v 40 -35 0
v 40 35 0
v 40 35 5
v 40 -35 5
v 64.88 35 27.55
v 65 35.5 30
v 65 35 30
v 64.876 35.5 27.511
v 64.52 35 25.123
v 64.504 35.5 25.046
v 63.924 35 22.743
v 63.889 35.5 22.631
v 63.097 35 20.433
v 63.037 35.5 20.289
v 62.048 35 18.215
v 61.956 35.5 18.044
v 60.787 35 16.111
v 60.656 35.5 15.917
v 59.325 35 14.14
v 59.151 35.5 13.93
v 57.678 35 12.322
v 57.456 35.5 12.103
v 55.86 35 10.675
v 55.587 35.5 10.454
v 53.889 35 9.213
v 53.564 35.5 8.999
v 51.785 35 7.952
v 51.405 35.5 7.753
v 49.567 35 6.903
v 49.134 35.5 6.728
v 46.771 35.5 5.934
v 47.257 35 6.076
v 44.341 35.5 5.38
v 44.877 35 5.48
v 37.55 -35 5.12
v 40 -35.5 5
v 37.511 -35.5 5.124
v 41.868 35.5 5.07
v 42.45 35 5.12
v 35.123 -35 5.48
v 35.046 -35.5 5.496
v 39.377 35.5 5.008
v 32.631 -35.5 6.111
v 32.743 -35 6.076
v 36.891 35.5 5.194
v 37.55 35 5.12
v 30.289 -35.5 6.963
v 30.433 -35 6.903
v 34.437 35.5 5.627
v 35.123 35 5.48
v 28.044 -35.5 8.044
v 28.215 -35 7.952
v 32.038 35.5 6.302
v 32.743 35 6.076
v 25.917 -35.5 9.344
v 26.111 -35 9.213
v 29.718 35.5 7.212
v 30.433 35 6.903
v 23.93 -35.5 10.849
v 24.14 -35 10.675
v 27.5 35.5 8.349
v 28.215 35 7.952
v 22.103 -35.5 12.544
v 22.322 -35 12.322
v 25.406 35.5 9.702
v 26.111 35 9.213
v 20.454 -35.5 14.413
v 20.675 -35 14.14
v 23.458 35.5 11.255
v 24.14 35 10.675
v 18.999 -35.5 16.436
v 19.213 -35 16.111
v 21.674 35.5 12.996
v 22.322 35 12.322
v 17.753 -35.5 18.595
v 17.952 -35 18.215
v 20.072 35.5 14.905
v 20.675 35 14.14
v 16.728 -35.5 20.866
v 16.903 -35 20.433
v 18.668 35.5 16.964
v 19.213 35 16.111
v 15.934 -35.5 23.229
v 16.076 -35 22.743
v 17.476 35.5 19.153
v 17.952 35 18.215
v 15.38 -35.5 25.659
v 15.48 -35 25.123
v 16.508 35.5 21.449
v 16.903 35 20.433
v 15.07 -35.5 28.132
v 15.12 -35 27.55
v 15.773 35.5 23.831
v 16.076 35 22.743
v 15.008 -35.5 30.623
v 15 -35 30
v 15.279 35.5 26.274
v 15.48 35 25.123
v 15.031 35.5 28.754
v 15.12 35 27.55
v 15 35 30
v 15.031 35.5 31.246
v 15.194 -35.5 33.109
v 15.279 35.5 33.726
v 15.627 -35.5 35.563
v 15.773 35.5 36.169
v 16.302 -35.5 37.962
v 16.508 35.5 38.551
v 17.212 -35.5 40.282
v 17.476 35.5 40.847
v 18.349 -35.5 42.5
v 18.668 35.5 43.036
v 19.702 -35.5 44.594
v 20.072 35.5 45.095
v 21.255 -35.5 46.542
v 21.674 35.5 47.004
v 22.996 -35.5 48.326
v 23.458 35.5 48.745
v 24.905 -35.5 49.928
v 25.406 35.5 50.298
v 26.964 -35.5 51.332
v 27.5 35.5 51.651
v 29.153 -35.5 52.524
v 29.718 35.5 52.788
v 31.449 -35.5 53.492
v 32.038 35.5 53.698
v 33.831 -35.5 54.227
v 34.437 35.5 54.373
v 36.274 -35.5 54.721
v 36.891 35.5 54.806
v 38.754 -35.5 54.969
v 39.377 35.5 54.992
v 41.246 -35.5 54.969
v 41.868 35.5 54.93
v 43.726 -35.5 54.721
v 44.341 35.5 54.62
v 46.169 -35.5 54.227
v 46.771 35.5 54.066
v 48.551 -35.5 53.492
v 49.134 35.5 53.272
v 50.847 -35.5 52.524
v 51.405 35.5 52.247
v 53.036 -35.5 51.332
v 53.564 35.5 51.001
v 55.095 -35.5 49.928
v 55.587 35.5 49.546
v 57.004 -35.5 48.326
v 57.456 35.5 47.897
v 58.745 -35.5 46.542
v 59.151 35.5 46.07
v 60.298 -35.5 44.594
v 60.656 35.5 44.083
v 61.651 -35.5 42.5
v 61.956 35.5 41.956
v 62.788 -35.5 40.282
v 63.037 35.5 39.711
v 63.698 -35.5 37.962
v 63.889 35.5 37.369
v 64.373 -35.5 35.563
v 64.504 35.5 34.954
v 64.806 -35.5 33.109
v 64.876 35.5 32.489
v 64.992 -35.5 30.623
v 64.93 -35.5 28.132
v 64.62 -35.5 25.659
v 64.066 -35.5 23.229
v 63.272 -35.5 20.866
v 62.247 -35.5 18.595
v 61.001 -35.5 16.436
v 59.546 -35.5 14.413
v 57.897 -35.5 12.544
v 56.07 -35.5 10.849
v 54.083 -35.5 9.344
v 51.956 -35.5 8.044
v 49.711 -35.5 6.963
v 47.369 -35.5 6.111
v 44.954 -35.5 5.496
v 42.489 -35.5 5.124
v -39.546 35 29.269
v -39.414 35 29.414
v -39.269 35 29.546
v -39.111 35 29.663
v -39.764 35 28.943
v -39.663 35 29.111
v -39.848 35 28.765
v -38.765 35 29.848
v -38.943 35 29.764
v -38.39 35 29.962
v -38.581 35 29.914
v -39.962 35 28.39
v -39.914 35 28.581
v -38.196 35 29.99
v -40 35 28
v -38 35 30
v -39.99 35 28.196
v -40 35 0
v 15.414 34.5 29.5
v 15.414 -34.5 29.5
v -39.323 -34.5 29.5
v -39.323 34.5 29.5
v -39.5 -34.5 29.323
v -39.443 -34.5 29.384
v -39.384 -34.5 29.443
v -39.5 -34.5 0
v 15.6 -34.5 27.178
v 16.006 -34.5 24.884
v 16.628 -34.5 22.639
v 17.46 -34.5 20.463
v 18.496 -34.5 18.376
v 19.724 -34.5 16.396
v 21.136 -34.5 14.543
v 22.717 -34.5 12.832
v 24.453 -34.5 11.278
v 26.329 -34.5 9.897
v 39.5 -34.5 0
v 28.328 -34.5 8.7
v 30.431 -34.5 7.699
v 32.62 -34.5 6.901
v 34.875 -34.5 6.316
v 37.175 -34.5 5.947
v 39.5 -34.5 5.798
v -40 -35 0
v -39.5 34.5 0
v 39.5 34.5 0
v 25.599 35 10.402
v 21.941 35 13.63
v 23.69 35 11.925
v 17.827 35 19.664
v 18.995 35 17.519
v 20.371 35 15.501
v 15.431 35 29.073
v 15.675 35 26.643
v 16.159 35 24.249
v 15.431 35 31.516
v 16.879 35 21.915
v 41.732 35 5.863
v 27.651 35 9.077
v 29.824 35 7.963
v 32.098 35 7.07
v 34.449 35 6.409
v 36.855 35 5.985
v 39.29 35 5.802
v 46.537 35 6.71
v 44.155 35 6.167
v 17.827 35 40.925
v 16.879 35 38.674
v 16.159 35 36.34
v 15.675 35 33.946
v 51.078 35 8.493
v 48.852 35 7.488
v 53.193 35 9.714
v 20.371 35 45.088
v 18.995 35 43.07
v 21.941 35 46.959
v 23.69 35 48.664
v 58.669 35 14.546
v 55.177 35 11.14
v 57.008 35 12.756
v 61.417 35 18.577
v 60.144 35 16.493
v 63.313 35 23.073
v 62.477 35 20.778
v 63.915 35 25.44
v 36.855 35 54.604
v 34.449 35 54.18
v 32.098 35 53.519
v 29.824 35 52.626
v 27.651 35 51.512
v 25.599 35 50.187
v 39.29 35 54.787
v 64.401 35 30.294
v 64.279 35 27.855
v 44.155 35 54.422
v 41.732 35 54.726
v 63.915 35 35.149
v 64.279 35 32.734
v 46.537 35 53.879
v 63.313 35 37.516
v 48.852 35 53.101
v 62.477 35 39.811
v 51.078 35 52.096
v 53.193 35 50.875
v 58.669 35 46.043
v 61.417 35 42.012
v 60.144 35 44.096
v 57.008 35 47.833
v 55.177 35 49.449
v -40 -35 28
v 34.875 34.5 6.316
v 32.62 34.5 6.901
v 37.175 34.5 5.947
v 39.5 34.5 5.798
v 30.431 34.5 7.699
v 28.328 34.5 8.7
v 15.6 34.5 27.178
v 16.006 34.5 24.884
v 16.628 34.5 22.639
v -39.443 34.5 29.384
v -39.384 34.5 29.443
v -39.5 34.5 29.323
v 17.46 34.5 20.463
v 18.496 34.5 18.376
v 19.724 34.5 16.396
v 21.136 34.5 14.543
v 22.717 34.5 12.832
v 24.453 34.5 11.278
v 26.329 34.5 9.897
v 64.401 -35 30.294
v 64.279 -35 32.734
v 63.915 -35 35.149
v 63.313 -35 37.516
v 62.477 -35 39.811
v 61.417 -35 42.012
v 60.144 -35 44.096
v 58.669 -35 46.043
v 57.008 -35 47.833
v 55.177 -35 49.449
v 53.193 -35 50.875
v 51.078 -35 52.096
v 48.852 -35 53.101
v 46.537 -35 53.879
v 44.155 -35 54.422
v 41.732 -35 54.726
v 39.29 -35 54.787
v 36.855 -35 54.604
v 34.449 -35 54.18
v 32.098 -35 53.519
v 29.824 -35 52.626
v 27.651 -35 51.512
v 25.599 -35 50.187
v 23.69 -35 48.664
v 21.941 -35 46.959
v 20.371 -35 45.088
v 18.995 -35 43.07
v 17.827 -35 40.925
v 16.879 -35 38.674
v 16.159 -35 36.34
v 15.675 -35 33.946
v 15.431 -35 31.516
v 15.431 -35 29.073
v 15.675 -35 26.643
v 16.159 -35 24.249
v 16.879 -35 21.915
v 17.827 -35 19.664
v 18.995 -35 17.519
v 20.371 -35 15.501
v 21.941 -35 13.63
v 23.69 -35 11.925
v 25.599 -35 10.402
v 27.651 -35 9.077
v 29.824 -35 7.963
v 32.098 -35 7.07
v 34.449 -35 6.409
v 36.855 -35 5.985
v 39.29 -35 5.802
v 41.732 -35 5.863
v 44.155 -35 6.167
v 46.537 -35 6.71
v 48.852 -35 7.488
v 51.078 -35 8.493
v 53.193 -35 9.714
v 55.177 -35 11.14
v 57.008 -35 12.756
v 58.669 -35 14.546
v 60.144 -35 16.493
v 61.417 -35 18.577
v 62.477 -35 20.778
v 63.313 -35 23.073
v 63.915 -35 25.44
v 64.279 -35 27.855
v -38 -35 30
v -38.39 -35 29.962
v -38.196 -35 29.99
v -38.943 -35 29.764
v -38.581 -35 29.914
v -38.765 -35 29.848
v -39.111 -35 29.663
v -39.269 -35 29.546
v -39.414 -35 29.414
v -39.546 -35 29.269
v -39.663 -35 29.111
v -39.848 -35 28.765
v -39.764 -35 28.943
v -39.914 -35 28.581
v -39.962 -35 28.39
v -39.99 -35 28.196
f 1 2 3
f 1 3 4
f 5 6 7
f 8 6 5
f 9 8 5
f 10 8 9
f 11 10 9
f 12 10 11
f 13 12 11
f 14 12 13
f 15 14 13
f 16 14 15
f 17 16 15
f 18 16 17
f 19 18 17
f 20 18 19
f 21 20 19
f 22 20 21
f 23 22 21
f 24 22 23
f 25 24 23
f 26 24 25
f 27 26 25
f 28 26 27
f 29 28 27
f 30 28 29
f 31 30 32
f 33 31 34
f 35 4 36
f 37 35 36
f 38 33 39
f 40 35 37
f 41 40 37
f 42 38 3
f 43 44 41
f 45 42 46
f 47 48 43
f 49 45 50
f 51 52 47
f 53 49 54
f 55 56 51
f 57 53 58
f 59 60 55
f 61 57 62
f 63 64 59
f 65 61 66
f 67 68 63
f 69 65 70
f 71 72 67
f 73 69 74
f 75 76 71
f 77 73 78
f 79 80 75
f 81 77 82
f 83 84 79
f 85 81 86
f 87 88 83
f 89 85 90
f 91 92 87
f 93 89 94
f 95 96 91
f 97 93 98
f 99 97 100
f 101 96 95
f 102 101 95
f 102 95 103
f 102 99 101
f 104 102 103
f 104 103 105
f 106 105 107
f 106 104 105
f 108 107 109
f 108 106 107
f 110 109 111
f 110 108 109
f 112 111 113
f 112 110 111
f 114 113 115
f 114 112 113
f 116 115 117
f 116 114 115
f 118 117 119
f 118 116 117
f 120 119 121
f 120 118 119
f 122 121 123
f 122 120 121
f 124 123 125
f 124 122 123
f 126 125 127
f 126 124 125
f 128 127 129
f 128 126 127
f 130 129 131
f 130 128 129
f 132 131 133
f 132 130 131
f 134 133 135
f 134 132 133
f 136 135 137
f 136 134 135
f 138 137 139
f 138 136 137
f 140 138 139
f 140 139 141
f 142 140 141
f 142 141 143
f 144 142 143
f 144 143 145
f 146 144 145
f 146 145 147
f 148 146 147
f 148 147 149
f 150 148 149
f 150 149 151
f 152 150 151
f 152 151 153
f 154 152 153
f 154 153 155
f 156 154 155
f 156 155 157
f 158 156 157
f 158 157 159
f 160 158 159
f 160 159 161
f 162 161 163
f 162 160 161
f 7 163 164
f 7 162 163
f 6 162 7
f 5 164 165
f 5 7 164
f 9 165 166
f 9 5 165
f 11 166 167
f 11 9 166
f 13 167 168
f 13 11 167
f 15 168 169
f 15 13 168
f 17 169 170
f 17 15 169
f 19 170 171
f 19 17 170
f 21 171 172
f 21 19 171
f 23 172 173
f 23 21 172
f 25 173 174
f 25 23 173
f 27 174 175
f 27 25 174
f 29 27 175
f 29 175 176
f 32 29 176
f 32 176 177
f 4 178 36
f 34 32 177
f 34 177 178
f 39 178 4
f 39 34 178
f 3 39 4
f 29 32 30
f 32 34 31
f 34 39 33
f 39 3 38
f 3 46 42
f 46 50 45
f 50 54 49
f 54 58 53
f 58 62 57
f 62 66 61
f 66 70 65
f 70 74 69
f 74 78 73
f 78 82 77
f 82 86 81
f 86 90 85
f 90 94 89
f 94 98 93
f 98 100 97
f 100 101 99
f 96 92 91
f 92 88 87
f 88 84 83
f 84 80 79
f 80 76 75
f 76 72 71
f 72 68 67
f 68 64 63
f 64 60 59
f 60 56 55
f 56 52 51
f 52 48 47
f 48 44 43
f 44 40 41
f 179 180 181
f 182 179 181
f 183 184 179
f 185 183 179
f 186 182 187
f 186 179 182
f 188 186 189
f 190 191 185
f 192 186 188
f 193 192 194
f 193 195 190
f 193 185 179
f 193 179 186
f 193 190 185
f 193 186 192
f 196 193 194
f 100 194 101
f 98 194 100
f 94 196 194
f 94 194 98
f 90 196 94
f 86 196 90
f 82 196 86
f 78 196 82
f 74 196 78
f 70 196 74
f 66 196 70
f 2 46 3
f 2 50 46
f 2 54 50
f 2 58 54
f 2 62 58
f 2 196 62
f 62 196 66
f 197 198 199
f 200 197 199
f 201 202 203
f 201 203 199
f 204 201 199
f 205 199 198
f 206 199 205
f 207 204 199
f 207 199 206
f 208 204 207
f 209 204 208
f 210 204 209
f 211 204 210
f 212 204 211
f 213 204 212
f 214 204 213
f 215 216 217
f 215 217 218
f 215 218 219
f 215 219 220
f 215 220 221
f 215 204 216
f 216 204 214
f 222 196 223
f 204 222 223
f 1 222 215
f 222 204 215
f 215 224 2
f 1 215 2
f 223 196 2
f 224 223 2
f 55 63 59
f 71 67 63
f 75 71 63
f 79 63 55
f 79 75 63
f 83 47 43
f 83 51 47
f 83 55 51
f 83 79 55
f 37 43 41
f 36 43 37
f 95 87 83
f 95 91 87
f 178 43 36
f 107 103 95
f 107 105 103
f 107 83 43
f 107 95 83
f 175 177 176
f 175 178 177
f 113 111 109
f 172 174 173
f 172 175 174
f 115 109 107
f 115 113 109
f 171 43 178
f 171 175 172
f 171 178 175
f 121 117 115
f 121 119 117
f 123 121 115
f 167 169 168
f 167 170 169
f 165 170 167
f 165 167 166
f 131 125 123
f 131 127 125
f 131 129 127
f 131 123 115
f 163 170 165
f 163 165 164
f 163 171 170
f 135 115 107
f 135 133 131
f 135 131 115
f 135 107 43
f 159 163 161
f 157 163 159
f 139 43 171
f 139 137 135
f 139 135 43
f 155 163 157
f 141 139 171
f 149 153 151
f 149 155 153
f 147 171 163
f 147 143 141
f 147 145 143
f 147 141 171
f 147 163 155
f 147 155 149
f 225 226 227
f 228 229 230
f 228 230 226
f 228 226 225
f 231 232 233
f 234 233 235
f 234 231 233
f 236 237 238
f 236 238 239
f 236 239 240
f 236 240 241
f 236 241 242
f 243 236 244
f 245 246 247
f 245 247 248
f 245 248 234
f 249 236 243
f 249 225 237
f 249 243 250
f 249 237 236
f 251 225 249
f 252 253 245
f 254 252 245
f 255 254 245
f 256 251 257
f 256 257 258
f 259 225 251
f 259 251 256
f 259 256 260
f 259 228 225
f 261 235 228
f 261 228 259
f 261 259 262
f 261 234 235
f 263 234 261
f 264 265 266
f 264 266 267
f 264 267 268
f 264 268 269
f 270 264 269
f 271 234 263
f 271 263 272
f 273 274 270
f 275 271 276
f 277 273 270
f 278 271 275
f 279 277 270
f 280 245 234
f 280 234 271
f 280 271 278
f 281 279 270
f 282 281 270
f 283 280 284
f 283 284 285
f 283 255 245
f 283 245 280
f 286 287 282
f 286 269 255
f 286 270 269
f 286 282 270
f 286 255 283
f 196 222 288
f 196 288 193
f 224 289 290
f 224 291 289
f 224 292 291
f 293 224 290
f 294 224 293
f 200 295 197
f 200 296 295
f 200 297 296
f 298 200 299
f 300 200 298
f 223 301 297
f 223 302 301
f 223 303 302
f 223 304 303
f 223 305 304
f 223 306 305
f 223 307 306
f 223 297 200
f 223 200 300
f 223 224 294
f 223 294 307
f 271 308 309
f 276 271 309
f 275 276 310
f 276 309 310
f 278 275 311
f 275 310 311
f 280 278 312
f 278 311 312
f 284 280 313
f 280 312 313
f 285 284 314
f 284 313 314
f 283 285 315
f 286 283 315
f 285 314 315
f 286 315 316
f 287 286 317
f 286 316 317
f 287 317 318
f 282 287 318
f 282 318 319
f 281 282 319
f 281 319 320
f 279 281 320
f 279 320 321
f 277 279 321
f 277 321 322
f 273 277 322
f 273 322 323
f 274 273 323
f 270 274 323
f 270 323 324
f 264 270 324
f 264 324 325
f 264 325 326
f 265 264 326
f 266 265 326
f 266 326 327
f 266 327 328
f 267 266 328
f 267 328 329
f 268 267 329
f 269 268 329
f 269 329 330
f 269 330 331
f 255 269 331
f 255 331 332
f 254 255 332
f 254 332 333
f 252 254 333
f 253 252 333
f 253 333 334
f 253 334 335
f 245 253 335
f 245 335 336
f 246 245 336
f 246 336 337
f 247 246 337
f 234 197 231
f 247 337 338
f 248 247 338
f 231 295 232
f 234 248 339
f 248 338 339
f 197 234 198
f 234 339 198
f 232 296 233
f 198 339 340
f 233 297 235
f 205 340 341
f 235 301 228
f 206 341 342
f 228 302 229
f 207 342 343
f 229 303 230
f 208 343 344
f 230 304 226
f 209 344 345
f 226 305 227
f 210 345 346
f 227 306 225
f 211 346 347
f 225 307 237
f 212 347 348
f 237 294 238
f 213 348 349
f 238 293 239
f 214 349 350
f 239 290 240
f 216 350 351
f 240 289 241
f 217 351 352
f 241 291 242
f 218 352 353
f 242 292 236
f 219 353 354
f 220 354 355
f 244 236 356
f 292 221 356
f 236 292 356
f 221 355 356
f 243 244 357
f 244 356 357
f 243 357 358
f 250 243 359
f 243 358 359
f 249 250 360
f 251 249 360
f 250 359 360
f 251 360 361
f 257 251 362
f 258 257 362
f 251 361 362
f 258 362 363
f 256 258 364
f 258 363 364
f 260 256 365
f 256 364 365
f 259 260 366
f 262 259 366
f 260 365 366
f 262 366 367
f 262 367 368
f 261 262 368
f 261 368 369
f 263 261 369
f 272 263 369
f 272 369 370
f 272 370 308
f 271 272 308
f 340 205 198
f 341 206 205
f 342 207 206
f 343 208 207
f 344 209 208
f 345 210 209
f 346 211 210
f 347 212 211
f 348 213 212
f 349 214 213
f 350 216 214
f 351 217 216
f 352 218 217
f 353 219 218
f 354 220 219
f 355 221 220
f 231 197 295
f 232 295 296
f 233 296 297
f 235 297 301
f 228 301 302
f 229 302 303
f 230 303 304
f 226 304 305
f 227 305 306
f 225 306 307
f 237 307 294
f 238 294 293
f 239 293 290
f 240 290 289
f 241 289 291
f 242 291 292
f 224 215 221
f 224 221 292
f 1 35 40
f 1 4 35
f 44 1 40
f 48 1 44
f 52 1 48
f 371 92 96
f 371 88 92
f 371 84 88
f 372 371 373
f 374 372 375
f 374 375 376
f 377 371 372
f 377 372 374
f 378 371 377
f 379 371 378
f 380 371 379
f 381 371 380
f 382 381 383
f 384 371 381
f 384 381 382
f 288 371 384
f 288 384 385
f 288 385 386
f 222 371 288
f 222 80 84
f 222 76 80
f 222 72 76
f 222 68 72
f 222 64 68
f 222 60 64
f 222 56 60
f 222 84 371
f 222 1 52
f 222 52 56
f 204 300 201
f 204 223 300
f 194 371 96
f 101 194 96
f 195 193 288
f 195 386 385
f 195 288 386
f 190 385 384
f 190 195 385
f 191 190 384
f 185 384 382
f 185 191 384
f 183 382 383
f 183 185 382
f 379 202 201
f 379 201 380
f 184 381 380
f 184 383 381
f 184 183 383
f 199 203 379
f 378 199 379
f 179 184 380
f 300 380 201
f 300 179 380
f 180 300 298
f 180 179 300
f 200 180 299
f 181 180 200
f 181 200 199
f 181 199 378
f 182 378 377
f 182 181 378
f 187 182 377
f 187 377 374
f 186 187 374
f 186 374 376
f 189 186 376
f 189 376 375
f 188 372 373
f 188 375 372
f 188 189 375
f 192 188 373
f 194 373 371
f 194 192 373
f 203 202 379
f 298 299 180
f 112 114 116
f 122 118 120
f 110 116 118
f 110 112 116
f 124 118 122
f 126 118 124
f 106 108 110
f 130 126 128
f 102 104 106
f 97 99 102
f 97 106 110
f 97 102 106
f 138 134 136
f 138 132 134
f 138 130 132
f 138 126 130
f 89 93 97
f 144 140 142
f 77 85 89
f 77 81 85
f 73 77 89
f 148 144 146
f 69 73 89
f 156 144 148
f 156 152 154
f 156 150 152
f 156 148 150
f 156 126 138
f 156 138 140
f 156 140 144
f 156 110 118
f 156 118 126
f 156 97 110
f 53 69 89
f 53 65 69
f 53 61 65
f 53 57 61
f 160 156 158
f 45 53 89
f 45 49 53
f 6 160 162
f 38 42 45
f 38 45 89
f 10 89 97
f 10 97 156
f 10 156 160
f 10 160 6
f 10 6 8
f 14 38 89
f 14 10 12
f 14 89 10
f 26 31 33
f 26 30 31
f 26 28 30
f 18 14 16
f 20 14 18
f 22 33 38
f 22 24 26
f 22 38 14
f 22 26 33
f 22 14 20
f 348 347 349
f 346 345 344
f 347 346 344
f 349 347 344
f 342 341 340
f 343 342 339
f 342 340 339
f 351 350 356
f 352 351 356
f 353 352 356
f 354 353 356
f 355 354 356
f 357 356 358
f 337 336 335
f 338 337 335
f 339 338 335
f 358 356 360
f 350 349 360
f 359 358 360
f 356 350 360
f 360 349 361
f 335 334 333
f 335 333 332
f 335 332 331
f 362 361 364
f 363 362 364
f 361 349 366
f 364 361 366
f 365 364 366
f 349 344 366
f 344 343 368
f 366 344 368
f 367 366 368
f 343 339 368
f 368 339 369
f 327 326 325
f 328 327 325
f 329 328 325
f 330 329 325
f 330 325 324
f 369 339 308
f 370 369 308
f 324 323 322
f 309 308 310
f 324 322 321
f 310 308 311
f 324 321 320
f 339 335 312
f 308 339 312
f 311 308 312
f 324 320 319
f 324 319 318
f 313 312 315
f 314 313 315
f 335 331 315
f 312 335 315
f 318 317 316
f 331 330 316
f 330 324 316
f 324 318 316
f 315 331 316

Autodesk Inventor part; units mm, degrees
ref_plane "YZ Plane" through (0, 0, 0) normal (1, 0, 0) x (0, 1, 0)
ref_plane "XZ Plane" through (0, 0, 0) normal (0, 1, 0) x (-1, 0, 0)
ref_plane "XY Plane" through (0, 0, 0) normal (0, 0, 1) x (1, 0, 0)
sketch "Sketch1" plane through (0, 0, 0) normal (0, 0, 1) x (1, 0, 0)
  line L0 (-40, 35) -> (40, 35)
  line L1 (40, 35) -> (40, -35)
  line L2 (40, -35) -> (-40, -35)
  line L3 (-40, -35) -> (-40, 35)
  line L4 (-40, 35) -> (40, -35) construction
  line L5 (40, 35) -> (-40, -35) construction
  point P0 (0, 0)
  dimension "d0" = 70
  dimension "d1" = 80
extrude "Extrusion1" add sketch "Sketch1" along normal blind 30
sketch "Sketch2" plane through (-40, 35, 0) normal (0, 1, 0) x (1, 0, 0)
  line L0 (80, -30) -> (0, -30) projected
  circle A0 centre (80, -30) radius 25
  point P0 (40, 0)
  dimension "d4" = 50
extrude "Extrusion2" add sketch "Sketch2" against normal blind 70
extrude "Extrusion3" add sketch "Sketch2" along normal blind 0.5
sketch "Sketch3" plane through (-40, -35, 0) normal (0, -1, 0) x (1, 0, 0)
  circle A0 centre (79.901, 30.2944) radius 25
  line L0 (53.0517, 30.2944) -> (54.901, 30.2944)
  circle A1 centre (79.901, 30.2944) radius 24.5
  point P0 (40, 0)
  dimension "d9" = 50
  dimension "d19" = 49
fillet "Fillet1" radius 2 1 edges at (-40, 0, 30)
sketch "Sketch4" plane through (0, 0, 0) normal (0, 0, -1) x (-1, 0, 0)
  line L0 (40, -35) -> (38, -35) projected
  line L1 (40, -35) -> (39, -35)
  line L2 (-40, 35) -> (-15, 35) projected
  line L3 (-40, 35) -> (-39, 35)
  line L4 (39.5, -34.5) -> (-39.5, -34.5)
  line L5 (-39.5, -34.5) -> (-39.5, 34.5)
  line L6 (-39.5, 34.5) -> (39.5, 34.5)
  line L7 (39.5, 34.5) -> (39.5, -34.5)
  line L8 (40, -35) -> (40, 35) projected
  line L9 (-40, 35) -> (-40, -35) projected
  line L10 (-40, -35) -> (40, -35) projected
  line L11 (40, 35) -> (-40, 35) projected
  point P0 (0, 0)
  dimension "d24" = 0.5
  dimension "d25" = 0.5
  dimension "d26" = 0.5
  dimension "d27" = 0.5
extrude "Extrusion6" cut sketch "Sketch3" against normal blind 70 contours A1
sketch "Sketch5" plane through (-40, -35, 0) normal (0, -1, 0) x (1, 0, 0)
  arc A0 (80, 5) -> (55, 30) centre (80, 30) ccw projected
  circle A1 centre (80, 30) radius 25
  point P0 (40, 0)
extrude "Extrusion7" add sketch "Sketch5" along normal blind 0.5
extrude "Extrusion8" cut sketch "Sketch4" against normal blind 29.5 contours L4 L5 L6 L7
equation "\"BendRadius\" = Thickness"
equation "\"BendReliefWidth\" = Thickness"
equation "\"BendReliefDepth\" = 0.5 * Thickness"
equation "\"CornerReliefSize\" = 4 * Thickness"
equation "\"MinimumRemnant\" = 2 * Thickness"
equation "\"TransitionRadius\" = BendRadius"
equation "\"JacobiRadiusSize\" = Thickness"
equation "\"GapSize\" = Thickness"
equation "\"Thickness\" = 0.5"
properties part number "Battery Box" material "Steel, Mild"
